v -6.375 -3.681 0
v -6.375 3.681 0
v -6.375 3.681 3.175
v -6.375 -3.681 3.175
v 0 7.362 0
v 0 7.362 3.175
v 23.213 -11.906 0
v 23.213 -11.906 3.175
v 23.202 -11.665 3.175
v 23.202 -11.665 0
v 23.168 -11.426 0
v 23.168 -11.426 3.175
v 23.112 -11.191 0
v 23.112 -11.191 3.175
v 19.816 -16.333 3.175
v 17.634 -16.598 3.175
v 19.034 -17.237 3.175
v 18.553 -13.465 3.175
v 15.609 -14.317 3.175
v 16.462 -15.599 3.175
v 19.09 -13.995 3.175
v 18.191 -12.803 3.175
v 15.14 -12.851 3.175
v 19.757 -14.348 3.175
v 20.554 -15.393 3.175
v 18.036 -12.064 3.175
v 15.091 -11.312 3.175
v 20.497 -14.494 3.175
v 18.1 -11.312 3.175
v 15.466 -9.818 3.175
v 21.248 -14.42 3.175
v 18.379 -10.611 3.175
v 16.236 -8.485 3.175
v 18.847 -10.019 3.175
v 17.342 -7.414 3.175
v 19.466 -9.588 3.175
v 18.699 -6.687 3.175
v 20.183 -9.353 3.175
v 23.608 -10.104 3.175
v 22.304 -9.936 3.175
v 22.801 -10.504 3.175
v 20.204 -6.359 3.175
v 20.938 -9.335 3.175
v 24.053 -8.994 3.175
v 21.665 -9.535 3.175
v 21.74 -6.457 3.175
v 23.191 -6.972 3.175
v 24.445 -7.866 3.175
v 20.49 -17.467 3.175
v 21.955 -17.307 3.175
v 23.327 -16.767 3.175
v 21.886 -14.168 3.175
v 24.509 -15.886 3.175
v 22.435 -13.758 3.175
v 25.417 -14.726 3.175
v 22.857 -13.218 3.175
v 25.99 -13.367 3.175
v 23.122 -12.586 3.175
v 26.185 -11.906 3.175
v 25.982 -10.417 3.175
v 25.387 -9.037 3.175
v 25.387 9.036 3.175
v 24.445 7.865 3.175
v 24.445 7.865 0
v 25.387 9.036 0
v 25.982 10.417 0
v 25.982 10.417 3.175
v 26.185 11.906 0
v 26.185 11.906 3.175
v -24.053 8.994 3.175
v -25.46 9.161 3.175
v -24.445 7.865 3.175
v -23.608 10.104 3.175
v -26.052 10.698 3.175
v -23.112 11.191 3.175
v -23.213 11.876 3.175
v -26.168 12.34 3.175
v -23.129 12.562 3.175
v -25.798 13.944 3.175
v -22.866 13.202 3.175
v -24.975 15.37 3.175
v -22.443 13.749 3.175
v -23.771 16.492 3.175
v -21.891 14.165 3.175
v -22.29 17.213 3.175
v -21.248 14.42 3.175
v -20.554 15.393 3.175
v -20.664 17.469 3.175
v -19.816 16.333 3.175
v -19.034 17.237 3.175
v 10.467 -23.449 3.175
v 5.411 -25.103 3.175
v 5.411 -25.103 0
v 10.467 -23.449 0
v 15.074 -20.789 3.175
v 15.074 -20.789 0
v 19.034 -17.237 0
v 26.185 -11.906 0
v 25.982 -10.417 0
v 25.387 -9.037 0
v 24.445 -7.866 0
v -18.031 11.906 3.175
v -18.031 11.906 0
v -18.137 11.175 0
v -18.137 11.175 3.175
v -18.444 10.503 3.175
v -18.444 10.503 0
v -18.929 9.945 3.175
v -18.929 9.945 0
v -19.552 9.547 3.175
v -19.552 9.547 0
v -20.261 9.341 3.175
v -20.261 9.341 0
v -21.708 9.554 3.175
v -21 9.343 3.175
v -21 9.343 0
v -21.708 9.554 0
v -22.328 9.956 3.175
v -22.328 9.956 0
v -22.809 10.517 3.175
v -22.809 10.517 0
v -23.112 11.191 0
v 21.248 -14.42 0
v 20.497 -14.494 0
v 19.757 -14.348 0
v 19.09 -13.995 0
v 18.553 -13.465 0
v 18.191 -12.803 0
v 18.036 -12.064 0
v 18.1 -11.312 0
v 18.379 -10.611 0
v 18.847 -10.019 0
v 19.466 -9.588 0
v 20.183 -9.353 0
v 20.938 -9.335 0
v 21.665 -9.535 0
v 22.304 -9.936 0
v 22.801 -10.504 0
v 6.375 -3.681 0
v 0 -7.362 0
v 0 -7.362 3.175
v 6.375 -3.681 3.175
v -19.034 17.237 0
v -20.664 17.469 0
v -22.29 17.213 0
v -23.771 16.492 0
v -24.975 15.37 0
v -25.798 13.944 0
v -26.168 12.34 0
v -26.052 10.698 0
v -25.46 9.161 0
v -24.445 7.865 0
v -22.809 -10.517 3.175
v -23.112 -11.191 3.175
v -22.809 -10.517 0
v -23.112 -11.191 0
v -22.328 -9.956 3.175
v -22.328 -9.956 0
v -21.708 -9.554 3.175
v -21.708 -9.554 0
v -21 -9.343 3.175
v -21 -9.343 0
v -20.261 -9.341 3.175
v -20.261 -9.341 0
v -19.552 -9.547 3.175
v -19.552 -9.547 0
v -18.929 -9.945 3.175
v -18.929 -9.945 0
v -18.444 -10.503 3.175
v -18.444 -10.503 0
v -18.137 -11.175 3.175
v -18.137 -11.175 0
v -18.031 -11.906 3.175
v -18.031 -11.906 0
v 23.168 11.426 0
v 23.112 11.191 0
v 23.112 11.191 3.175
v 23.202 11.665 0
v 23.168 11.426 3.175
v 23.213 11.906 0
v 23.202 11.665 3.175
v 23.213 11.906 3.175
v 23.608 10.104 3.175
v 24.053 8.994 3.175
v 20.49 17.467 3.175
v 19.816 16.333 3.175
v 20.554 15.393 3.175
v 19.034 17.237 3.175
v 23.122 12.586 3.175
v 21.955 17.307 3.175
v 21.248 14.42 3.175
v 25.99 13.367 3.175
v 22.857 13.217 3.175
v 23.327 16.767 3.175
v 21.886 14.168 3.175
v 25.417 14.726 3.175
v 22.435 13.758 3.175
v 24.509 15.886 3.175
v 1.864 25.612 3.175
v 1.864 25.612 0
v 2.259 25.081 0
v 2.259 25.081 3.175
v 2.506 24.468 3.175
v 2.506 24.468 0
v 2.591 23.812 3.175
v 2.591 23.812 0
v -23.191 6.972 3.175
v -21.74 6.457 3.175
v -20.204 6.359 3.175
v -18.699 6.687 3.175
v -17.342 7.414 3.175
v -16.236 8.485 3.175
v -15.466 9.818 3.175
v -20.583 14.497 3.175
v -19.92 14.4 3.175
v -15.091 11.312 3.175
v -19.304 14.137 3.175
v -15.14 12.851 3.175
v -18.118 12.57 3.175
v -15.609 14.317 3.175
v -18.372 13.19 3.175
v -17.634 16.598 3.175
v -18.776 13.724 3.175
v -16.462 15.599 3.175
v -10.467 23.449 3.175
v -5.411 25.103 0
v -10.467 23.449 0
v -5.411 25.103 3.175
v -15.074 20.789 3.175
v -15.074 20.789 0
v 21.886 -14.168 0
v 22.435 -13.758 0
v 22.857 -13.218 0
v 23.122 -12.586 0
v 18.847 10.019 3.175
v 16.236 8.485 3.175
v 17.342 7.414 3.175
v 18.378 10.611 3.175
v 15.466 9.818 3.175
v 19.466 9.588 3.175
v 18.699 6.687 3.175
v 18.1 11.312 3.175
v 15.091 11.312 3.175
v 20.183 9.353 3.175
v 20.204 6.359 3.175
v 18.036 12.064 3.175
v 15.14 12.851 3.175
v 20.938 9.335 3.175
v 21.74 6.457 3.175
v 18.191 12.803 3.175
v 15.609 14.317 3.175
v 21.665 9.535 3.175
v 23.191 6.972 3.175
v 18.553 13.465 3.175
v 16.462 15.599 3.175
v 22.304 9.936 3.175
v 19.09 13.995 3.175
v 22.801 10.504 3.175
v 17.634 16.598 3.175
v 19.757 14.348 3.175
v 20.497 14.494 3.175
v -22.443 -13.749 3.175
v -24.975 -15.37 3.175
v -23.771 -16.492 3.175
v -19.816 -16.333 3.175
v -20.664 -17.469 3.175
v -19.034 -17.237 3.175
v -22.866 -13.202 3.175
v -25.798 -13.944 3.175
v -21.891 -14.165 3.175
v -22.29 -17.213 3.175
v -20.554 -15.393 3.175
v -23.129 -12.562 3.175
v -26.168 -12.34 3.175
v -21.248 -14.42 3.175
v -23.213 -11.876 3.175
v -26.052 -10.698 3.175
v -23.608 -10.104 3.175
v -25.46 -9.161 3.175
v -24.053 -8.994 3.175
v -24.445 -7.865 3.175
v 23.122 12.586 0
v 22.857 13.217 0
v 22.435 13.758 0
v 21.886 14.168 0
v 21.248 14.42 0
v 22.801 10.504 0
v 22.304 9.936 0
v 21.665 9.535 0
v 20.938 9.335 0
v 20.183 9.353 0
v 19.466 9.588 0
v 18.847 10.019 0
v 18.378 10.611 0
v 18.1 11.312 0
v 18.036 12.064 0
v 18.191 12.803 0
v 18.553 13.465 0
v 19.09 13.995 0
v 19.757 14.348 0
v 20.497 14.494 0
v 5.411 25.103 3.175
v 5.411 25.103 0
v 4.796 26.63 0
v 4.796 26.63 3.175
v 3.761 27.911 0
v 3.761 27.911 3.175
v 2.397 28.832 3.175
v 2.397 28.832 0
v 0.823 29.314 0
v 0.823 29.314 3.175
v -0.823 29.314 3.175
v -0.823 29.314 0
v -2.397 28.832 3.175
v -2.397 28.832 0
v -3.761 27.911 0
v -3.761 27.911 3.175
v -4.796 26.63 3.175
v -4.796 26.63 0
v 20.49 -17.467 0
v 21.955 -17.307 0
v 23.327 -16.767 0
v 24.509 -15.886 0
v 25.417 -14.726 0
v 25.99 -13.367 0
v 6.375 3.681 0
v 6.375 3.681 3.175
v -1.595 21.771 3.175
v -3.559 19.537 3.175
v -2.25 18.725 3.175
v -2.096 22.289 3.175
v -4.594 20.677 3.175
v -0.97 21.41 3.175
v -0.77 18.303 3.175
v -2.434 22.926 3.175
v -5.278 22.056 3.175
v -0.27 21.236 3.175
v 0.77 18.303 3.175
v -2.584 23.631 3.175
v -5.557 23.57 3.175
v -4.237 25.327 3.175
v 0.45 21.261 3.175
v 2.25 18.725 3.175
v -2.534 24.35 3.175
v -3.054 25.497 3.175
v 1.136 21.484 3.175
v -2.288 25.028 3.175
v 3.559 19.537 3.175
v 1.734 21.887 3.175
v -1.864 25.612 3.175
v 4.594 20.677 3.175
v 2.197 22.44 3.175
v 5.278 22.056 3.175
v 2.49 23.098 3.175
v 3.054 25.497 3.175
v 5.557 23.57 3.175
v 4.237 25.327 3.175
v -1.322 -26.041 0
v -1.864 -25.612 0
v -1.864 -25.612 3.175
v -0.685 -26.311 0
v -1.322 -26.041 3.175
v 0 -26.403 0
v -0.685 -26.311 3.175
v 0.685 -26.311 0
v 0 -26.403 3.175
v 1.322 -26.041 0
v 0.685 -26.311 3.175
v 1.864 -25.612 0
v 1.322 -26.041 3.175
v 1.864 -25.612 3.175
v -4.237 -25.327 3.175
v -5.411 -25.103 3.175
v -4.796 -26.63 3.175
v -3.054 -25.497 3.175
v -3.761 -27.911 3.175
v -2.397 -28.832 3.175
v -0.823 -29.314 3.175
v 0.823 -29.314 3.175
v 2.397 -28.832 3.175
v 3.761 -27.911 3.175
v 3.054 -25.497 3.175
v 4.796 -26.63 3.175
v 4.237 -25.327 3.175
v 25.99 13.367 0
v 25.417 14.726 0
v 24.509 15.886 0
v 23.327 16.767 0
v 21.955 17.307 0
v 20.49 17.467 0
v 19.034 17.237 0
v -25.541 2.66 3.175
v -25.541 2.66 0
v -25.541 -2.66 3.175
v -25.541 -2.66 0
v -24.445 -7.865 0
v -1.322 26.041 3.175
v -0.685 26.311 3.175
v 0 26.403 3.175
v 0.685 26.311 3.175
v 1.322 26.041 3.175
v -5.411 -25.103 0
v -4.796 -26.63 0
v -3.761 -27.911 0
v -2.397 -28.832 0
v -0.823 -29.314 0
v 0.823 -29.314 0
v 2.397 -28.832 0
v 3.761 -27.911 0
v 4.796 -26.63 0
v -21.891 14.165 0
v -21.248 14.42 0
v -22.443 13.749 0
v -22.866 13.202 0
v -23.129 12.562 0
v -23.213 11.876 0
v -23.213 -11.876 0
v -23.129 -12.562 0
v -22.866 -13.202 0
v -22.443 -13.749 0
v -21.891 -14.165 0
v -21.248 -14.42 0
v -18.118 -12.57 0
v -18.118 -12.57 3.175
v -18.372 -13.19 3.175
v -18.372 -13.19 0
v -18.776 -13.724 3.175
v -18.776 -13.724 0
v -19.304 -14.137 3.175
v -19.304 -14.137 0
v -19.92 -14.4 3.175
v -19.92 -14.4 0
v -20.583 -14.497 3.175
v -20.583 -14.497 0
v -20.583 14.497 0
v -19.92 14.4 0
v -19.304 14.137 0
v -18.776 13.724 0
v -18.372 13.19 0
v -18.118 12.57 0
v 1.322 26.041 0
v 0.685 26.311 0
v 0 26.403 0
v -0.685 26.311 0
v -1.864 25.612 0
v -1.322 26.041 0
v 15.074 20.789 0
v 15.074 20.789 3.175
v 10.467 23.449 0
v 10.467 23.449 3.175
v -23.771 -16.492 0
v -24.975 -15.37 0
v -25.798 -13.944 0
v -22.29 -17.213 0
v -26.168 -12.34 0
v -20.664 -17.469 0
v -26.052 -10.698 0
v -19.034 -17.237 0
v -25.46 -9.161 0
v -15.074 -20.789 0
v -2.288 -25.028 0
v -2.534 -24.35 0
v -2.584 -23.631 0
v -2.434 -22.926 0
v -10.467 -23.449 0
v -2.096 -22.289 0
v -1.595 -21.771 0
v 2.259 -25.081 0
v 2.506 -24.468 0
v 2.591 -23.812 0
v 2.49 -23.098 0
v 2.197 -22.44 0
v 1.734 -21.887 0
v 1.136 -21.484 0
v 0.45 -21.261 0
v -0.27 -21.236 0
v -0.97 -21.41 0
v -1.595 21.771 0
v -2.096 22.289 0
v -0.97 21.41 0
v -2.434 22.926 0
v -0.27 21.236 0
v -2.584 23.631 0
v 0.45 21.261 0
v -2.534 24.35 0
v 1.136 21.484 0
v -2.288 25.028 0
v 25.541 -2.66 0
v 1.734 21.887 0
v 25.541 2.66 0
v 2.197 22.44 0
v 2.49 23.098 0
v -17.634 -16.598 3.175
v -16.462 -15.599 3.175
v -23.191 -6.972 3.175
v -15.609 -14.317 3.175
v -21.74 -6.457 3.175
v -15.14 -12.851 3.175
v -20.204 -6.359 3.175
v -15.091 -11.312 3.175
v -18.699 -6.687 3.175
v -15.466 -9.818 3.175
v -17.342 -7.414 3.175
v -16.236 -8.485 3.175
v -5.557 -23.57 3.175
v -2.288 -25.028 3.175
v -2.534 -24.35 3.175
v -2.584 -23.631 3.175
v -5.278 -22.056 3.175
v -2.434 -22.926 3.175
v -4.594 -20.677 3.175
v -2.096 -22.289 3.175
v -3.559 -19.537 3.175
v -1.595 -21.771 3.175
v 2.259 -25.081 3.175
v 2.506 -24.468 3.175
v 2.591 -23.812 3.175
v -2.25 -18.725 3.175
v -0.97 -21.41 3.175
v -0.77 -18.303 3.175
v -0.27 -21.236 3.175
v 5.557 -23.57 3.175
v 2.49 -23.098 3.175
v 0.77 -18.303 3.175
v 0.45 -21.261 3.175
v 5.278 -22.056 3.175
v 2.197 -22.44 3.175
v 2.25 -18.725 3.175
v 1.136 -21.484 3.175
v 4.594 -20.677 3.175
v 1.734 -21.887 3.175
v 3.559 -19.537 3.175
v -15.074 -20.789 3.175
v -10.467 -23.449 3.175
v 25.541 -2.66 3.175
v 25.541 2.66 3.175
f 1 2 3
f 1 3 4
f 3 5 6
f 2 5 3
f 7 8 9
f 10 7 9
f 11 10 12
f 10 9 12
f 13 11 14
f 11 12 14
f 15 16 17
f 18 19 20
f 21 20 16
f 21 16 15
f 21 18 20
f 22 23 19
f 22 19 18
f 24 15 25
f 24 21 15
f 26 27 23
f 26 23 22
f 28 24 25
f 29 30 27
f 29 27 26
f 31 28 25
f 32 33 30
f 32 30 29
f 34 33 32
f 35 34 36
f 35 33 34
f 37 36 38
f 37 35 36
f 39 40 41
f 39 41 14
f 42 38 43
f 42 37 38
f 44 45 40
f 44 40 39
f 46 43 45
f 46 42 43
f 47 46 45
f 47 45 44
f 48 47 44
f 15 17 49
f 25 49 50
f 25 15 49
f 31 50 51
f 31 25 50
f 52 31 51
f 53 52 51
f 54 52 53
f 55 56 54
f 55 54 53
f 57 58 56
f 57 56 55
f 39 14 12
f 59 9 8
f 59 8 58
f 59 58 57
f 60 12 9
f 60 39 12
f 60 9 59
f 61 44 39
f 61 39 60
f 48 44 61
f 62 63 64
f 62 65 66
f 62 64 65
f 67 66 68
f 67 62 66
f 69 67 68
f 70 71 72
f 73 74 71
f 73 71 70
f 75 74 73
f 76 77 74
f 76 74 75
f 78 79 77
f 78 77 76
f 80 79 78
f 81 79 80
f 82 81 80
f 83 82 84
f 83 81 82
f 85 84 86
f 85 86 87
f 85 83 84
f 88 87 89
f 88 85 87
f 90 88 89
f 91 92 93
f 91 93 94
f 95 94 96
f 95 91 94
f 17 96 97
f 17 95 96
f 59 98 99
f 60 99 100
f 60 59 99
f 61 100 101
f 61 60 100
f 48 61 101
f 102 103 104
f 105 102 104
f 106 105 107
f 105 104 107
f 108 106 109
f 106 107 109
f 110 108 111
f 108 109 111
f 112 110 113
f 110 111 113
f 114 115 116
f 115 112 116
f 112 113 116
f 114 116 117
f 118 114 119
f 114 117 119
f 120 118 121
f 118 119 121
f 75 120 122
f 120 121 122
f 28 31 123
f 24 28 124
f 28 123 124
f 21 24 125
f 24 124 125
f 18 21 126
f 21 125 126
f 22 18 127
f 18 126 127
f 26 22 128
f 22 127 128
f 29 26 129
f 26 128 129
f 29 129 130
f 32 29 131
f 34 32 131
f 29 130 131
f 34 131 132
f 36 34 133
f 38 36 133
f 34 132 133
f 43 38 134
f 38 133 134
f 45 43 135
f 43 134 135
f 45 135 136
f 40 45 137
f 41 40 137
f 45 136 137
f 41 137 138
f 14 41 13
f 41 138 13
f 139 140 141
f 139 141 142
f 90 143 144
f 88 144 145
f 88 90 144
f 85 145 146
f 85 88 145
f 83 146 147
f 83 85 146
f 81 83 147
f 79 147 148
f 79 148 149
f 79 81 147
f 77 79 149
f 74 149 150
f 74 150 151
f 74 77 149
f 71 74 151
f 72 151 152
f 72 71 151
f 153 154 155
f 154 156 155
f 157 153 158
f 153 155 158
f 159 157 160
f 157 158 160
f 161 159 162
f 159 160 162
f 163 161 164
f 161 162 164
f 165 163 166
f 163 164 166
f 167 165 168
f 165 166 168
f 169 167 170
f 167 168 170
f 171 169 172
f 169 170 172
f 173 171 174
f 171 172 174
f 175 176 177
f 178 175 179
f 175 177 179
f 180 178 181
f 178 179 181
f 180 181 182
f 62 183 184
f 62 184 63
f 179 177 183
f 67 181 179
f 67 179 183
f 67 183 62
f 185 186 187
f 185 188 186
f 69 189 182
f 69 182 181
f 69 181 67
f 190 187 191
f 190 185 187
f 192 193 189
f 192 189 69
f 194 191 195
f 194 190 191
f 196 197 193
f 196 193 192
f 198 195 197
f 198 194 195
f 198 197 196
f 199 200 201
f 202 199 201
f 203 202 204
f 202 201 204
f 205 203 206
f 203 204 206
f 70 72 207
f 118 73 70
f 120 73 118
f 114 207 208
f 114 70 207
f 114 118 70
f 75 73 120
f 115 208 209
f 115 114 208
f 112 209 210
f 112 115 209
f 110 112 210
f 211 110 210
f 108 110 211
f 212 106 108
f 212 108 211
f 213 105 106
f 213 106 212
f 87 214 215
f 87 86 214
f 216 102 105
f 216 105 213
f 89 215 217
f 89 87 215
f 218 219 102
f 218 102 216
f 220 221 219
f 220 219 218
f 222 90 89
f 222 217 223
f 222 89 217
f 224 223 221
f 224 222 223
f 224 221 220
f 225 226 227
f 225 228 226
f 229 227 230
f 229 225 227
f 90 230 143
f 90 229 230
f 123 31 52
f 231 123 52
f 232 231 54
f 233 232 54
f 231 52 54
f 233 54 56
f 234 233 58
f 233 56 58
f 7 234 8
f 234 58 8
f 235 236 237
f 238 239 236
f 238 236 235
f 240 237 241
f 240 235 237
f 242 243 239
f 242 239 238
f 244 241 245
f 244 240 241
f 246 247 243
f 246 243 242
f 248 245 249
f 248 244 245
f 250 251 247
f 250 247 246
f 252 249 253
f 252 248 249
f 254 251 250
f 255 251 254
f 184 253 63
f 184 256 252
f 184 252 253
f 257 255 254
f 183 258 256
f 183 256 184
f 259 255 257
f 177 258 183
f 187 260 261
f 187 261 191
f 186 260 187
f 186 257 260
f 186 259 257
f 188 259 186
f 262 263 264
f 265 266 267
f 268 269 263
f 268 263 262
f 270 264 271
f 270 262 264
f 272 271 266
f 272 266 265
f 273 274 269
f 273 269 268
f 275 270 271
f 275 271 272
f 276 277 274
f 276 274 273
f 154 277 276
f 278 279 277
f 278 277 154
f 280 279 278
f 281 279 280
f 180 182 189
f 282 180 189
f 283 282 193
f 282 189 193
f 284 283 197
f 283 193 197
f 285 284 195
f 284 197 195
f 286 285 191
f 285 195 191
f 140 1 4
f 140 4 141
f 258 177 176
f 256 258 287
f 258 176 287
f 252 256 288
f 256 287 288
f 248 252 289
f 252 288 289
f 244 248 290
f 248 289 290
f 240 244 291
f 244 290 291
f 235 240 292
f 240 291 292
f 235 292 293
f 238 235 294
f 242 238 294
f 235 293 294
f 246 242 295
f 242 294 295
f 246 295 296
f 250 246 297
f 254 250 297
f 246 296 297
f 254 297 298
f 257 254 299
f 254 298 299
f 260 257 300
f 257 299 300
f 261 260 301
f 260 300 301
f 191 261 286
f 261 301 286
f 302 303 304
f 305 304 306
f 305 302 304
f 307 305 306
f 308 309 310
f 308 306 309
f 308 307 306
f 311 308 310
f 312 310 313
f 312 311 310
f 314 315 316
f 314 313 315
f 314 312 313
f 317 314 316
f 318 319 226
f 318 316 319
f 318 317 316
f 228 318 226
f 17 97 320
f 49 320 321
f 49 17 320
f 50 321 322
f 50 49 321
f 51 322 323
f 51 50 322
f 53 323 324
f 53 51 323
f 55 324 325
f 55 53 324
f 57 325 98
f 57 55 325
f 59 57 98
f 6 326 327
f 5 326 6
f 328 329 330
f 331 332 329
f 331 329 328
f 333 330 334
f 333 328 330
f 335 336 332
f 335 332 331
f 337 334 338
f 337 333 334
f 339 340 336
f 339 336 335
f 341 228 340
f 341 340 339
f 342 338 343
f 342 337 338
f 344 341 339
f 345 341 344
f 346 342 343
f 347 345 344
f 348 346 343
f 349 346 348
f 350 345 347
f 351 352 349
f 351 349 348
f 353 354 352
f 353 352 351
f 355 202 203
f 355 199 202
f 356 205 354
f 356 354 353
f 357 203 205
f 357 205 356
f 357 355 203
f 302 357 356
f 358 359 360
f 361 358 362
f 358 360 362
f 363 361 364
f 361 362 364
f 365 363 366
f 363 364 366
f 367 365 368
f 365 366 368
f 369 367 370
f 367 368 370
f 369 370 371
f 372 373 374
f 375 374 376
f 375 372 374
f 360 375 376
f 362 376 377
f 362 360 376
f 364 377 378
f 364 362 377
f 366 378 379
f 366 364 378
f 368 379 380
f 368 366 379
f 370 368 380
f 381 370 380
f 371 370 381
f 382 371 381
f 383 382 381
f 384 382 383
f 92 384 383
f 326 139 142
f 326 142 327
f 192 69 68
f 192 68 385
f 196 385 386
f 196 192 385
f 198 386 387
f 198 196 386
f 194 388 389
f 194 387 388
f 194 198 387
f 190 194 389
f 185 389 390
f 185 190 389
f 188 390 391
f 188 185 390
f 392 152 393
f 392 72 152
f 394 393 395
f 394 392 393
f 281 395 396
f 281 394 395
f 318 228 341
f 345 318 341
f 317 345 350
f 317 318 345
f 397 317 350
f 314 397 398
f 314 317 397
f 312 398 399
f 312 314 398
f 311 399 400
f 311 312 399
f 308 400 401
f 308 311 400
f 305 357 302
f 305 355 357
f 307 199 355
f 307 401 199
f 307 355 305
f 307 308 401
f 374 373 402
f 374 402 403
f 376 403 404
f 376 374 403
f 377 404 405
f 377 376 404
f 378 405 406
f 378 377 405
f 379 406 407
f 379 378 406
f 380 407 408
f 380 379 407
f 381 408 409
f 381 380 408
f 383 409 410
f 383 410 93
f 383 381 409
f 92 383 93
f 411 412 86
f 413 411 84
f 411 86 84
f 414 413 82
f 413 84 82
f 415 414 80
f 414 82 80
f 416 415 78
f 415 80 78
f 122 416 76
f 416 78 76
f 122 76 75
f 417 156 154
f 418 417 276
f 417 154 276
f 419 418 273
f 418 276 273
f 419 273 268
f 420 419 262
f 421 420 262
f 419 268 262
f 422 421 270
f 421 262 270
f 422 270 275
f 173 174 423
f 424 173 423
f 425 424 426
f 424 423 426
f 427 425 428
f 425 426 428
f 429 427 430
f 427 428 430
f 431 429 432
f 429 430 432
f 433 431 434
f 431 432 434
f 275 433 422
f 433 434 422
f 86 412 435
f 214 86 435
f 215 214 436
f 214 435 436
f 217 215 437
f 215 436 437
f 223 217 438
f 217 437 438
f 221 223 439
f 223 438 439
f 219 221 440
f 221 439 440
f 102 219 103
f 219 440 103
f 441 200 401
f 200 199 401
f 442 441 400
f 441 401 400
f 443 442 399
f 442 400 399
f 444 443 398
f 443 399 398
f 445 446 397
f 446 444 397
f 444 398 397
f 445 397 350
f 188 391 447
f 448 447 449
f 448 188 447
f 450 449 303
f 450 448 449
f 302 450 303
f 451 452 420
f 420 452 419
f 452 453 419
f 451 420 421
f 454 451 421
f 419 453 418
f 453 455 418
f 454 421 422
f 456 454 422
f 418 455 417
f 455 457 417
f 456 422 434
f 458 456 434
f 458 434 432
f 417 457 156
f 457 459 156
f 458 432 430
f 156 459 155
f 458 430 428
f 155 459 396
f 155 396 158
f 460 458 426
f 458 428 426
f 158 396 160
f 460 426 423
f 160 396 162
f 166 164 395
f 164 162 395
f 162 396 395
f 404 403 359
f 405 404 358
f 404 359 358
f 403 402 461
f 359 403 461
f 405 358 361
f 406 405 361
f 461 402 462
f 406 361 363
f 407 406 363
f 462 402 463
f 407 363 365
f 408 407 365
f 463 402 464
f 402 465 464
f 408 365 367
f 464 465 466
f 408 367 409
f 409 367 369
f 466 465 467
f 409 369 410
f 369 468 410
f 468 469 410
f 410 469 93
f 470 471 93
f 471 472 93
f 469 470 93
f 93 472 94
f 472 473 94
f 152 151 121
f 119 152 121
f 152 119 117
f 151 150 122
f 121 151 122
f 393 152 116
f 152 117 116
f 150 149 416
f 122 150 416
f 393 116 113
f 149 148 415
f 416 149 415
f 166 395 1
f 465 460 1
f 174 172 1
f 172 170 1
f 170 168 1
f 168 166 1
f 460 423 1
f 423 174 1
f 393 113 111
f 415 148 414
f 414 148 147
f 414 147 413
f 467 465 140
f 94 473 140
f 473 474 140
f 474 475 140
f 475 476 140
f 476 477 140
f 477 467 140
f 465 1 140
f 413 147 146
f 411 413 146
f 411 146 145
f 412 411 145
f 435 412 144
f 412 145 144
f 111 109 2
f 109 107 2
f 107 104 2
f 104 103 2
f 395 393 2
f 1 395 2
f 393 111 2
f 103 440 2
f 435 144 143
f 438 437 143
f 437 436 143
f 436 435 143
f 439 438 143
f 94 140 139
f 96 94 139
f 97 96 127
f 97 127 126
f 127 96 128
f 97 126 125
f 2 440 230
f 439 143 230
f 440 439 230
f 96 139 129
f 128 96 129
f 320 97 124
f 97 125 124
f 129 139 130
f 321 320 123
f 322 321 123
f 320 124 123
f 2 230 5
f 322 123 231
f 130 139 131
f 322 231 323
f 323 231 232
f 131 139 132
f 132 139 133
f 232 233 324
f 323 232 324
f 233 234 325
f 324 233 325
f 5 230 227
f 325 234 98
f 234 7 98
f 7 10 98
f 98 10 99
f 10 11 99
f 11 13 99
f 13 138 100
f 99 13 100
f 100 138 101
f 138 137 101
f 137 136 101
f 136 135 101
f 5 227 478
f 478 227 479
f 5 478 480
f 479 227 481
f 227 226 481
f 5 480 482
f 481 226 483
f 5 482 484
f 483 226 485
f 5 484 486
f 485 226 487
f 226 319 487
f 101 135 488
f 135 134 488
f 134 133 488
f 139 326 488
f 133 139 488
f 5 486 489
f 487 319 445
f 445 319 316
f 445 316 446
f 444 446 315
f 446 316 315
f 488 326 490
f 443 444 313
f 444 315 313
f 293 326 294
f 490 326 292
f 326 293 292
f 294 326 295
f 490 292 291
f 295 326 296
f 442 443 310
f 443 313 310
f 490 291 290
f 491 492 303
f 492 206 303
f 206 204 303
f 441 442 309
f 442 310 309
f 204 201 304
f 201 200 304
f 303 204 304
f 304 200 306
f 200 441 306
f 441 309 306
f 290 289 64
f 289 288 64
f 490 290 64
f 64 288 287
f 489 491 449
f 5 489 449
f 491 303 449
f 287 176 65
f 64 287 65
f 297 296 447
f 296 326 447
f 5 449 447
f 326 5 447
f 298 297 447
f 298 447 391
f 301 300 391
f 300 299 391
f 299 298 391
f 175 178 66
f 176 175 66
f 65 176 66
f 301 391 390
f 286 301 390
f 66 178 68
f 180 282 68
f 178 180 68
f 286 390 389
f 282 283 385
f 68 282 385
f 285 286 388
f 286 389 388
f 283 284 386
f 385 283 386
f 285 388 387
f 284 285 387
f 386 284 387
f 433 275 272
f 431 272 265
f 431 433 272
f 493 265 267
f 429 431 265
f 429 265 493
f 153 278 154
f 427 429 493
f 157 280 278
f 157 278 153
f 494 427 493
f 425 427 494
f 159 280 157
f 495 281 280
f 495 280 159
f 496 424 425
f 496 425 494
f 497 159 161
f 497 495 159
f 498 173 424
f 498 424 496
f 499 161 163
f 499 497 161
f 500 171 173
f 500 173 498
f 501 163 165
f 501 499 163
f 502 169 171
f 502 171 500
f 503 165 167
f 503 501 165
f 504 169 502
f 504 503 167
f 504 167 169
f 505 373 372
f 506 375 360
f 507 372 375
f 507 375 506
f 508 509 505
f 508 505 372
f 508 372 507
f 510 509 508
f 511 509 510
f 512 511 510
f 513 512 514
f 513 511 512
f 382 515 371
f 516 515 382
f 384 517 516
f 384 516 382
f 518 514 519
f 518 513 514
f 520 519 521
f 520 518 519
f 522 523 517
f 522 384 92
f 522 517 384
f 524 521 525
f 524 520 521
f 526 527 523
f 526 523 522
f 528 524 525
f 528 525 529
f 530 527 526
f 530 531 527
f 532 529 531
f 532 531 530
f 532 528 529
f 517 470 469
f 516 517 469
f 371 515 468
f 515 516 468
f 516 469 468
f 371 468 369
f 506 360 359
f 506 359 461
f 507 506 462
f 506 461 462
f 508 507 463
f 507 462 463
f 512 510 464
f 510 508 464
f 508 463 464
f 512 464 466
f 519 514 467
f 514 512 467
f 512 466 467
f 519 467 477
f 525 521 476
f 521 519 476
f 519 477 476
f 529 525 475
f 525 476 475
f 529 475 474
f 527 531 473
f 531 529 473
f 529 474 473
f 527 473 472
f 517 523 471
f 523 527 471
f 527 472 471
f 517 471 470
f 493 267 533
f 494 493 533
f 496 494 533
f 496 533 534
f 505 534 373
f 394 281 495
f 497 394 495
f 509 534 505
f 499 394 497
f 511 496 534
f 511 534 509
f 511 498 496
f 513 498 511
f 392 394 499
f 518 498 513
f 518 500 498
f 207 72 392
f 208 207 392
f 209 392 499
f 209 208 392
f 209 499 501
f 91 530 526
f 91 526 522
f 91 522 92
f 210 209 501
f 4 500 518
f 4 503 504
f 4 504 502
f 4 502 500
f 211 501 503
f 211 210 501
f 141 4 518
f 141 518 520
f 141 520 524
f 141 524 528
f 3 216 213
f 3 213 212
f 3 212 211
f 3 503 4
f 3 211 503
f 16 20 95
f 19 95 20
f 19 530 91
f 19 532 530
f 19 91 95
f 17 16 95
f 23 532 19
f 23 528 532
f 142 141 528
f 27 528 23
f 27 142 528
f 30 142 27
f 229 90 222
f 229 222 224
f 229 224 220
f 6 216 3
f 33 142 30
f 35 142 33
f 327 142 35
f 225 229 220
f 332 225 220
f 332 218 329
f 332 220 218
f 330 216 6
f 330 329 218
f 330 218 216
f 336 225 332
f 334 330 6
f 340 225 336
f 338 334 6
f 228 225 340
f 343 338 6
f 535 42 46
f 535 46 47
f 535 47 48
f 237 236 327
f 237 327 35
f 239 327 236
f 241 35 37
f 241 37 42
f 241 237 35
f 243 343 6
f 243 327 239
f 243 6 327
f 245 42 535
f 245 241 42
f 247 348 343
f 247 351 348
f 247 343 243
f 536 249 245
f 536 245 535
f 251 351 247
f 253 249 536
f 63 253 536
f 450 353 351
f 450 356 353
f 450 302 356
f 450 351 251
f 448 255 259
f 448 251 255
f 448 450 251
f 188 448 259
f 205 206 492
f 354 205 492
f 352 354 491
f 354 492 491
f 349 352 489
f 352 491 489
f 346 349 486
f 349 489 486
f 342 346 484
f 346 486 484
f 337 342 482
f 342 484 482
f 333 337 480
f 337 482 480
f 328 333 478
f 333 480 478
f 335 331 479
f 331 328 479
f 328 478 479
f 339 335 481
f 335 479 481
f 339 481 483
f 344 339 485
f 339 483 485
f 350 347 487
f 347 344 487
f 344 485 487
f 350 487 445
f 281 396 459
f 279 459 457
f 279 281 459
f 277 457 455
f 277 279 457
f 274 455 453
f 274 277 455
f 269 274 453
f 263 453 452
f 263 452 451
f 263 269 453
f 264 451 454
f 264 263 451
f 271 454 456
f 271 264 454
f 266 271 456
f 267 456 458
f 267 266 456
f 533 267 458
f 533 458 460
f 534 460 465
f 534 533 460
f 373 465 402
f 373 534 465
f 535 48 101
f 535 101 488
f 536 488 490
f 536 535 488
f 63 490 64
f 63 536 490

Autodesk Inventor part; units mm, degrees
ref_plane "YZ Plane" through (0, 0, 0) normal (1, 0, 0) x (0, 1, 0)
ref_plane "XZ Plane" through (0, 0, 0) normal (0, 1, 0) x (-1, 0, 0)
ref_plane "XY Plane" through (0, 0, 0) normal (0, 0, 1) x (1, 0, 0)
sketch "Sketch1" plane through (0, 0, 0) normal (0, 0, 1) x (1, 0, 0)
  circle A0 centre (0, 0) radius 28.575
  line L0 (0, -7.3617) -> (6.3754, -3.6809)
  line L1 (-6.3754, -3.6809) -> (0, -7.3617)
  line L2 (-6.3754, 3.6808) -> (-6.3754, -3.6809)
  line L3 (0, 7.3617) -> (-6.3754, 3.6808)
  line L4 (6.3754, 3.6808) -> (0, 7.3617)
  line L5 (6.3754, -3.6809) -> (6.3754, 3.6808)
  circle A1 centre (0, 23.8125) radius 2.5908
  circle A2 centre (-20.6222, 11.9062) radius 2.5908
  circle A3 centre (-20.6222, -11.9062) radius 2.5908
  circle A4 centre (0, -23.8125) radius 2.5908
  circle A5 centre (20.6222, -11.9063) radius 2.5908
  circle A6 centre (20.6222, 11.9062) radius 2.5908
  arc A7 (-2.587, 23.6716) -> (-19.2067, 14.0762) centre (0, 0) ccw
  arc A8 (-21.7937, 9.5954) -> (-21.7937, -9.5954) centre (0, 0) ccw
  arc A9 (-19.2067, -14.0762) -> (-2.587, -23.6716) centre (0, 0) ccw
  arc A10 (2.587, -23.6716) -> (19.2067, -14.0762) centre (0, 0) ccw
  arc A11 (21.7937, -9.5954) -> (21.7937, 9.5954) centre (0, 0) ccw
  arc A12 (19.2067, 14.0762) -> (2.587, 23.6716) centre (0, 0) ccw
  dimension "d7" = 5.1816
  dimension "d12" = 360
extrude "Extrusion1" add sketch "Sketch1" along normal blind 3.175 contours A0 | A1 A12 A6 A11 A5 A10 A4 A9 A3 A8 A2 A7
sketch "Sketch3" plane through (0, 0, 3.175) normal (0, 0, 1) x (1, 0, 0)
  circle A0 centre (20.6222, 11.9062) radius 2.5908 projected
  circle A1 centre (20.6222, -11.9063) radius 2.5908 projected
  circle A2 centre (0, -23.8125) radius 2.5908 projected
  circle A3 centre (-20.6222, -11.9062) radius 2.5908 projected
  circle A4 centre (-20.6222, 11.9062) radius 2.5908 projected
  circle A5 centre (0, 23.8125) radius 2.5908 projected
  circle A6 centre (0, 0) radius 28.575 projected
  circle A7 centre (0, 23.8125) radius 5.5626
  circle A8 centre (0, 0) radius 25.6794
  circle A9 centre (-20.6222, 11.9062) radius 5.5626
  circle A10 centre (-20.6222, -11.9062) radius 5.5626
  circle A11 centre (0, -23.8125) radius 5.5626
  circle A12 centre (20.6222, -11.9063) radius 5.5626
  circle A13 centre (20.6222, 11.9062) radius 5.5626
  dimension "d14" = 11.1252
  dimension "d15" = 51.3588
  dimension "d18" = 360
extrude "Extrusion3" cut sketch "Sketch3" against normal blind 3.175 contours A0 A8 A13 A6 | A8 A7 A6 A13 | A13 A6 A12 A8 | A8 A5 A7 A6 | A12 A6 A8 A1 | A8 A9 A6 A7 | A12 A6 A11 A8 | A8 A4 A9 A6 | A11 A6 A8 A2 | A9 A8 A10 A6 | A10 A8 A3 A6 | A6 A10 A8 A11
extrude "Extrusion2" add sketch "Sketch3" against normal blind 3.175 contours A0 A8 A13 A6 | A0 A8 A13 | A8 A5 A7 A6 | A7 A8 A5 | A13 A6 | A6 A7 | A12 A6 A8 A1 | A8 A1 A12 | A12 A6 | A9 A8 A4 | A8 A4 A9 A6 | A6 A9 | A11 A6 A8 A2 | A8 A2 A11 | A11 A6 | A10 A8 A3 A6 | A6 A10 | A10 A8 A3
properties part number "chassis hex hub clone" material "Aluminum 6061"
